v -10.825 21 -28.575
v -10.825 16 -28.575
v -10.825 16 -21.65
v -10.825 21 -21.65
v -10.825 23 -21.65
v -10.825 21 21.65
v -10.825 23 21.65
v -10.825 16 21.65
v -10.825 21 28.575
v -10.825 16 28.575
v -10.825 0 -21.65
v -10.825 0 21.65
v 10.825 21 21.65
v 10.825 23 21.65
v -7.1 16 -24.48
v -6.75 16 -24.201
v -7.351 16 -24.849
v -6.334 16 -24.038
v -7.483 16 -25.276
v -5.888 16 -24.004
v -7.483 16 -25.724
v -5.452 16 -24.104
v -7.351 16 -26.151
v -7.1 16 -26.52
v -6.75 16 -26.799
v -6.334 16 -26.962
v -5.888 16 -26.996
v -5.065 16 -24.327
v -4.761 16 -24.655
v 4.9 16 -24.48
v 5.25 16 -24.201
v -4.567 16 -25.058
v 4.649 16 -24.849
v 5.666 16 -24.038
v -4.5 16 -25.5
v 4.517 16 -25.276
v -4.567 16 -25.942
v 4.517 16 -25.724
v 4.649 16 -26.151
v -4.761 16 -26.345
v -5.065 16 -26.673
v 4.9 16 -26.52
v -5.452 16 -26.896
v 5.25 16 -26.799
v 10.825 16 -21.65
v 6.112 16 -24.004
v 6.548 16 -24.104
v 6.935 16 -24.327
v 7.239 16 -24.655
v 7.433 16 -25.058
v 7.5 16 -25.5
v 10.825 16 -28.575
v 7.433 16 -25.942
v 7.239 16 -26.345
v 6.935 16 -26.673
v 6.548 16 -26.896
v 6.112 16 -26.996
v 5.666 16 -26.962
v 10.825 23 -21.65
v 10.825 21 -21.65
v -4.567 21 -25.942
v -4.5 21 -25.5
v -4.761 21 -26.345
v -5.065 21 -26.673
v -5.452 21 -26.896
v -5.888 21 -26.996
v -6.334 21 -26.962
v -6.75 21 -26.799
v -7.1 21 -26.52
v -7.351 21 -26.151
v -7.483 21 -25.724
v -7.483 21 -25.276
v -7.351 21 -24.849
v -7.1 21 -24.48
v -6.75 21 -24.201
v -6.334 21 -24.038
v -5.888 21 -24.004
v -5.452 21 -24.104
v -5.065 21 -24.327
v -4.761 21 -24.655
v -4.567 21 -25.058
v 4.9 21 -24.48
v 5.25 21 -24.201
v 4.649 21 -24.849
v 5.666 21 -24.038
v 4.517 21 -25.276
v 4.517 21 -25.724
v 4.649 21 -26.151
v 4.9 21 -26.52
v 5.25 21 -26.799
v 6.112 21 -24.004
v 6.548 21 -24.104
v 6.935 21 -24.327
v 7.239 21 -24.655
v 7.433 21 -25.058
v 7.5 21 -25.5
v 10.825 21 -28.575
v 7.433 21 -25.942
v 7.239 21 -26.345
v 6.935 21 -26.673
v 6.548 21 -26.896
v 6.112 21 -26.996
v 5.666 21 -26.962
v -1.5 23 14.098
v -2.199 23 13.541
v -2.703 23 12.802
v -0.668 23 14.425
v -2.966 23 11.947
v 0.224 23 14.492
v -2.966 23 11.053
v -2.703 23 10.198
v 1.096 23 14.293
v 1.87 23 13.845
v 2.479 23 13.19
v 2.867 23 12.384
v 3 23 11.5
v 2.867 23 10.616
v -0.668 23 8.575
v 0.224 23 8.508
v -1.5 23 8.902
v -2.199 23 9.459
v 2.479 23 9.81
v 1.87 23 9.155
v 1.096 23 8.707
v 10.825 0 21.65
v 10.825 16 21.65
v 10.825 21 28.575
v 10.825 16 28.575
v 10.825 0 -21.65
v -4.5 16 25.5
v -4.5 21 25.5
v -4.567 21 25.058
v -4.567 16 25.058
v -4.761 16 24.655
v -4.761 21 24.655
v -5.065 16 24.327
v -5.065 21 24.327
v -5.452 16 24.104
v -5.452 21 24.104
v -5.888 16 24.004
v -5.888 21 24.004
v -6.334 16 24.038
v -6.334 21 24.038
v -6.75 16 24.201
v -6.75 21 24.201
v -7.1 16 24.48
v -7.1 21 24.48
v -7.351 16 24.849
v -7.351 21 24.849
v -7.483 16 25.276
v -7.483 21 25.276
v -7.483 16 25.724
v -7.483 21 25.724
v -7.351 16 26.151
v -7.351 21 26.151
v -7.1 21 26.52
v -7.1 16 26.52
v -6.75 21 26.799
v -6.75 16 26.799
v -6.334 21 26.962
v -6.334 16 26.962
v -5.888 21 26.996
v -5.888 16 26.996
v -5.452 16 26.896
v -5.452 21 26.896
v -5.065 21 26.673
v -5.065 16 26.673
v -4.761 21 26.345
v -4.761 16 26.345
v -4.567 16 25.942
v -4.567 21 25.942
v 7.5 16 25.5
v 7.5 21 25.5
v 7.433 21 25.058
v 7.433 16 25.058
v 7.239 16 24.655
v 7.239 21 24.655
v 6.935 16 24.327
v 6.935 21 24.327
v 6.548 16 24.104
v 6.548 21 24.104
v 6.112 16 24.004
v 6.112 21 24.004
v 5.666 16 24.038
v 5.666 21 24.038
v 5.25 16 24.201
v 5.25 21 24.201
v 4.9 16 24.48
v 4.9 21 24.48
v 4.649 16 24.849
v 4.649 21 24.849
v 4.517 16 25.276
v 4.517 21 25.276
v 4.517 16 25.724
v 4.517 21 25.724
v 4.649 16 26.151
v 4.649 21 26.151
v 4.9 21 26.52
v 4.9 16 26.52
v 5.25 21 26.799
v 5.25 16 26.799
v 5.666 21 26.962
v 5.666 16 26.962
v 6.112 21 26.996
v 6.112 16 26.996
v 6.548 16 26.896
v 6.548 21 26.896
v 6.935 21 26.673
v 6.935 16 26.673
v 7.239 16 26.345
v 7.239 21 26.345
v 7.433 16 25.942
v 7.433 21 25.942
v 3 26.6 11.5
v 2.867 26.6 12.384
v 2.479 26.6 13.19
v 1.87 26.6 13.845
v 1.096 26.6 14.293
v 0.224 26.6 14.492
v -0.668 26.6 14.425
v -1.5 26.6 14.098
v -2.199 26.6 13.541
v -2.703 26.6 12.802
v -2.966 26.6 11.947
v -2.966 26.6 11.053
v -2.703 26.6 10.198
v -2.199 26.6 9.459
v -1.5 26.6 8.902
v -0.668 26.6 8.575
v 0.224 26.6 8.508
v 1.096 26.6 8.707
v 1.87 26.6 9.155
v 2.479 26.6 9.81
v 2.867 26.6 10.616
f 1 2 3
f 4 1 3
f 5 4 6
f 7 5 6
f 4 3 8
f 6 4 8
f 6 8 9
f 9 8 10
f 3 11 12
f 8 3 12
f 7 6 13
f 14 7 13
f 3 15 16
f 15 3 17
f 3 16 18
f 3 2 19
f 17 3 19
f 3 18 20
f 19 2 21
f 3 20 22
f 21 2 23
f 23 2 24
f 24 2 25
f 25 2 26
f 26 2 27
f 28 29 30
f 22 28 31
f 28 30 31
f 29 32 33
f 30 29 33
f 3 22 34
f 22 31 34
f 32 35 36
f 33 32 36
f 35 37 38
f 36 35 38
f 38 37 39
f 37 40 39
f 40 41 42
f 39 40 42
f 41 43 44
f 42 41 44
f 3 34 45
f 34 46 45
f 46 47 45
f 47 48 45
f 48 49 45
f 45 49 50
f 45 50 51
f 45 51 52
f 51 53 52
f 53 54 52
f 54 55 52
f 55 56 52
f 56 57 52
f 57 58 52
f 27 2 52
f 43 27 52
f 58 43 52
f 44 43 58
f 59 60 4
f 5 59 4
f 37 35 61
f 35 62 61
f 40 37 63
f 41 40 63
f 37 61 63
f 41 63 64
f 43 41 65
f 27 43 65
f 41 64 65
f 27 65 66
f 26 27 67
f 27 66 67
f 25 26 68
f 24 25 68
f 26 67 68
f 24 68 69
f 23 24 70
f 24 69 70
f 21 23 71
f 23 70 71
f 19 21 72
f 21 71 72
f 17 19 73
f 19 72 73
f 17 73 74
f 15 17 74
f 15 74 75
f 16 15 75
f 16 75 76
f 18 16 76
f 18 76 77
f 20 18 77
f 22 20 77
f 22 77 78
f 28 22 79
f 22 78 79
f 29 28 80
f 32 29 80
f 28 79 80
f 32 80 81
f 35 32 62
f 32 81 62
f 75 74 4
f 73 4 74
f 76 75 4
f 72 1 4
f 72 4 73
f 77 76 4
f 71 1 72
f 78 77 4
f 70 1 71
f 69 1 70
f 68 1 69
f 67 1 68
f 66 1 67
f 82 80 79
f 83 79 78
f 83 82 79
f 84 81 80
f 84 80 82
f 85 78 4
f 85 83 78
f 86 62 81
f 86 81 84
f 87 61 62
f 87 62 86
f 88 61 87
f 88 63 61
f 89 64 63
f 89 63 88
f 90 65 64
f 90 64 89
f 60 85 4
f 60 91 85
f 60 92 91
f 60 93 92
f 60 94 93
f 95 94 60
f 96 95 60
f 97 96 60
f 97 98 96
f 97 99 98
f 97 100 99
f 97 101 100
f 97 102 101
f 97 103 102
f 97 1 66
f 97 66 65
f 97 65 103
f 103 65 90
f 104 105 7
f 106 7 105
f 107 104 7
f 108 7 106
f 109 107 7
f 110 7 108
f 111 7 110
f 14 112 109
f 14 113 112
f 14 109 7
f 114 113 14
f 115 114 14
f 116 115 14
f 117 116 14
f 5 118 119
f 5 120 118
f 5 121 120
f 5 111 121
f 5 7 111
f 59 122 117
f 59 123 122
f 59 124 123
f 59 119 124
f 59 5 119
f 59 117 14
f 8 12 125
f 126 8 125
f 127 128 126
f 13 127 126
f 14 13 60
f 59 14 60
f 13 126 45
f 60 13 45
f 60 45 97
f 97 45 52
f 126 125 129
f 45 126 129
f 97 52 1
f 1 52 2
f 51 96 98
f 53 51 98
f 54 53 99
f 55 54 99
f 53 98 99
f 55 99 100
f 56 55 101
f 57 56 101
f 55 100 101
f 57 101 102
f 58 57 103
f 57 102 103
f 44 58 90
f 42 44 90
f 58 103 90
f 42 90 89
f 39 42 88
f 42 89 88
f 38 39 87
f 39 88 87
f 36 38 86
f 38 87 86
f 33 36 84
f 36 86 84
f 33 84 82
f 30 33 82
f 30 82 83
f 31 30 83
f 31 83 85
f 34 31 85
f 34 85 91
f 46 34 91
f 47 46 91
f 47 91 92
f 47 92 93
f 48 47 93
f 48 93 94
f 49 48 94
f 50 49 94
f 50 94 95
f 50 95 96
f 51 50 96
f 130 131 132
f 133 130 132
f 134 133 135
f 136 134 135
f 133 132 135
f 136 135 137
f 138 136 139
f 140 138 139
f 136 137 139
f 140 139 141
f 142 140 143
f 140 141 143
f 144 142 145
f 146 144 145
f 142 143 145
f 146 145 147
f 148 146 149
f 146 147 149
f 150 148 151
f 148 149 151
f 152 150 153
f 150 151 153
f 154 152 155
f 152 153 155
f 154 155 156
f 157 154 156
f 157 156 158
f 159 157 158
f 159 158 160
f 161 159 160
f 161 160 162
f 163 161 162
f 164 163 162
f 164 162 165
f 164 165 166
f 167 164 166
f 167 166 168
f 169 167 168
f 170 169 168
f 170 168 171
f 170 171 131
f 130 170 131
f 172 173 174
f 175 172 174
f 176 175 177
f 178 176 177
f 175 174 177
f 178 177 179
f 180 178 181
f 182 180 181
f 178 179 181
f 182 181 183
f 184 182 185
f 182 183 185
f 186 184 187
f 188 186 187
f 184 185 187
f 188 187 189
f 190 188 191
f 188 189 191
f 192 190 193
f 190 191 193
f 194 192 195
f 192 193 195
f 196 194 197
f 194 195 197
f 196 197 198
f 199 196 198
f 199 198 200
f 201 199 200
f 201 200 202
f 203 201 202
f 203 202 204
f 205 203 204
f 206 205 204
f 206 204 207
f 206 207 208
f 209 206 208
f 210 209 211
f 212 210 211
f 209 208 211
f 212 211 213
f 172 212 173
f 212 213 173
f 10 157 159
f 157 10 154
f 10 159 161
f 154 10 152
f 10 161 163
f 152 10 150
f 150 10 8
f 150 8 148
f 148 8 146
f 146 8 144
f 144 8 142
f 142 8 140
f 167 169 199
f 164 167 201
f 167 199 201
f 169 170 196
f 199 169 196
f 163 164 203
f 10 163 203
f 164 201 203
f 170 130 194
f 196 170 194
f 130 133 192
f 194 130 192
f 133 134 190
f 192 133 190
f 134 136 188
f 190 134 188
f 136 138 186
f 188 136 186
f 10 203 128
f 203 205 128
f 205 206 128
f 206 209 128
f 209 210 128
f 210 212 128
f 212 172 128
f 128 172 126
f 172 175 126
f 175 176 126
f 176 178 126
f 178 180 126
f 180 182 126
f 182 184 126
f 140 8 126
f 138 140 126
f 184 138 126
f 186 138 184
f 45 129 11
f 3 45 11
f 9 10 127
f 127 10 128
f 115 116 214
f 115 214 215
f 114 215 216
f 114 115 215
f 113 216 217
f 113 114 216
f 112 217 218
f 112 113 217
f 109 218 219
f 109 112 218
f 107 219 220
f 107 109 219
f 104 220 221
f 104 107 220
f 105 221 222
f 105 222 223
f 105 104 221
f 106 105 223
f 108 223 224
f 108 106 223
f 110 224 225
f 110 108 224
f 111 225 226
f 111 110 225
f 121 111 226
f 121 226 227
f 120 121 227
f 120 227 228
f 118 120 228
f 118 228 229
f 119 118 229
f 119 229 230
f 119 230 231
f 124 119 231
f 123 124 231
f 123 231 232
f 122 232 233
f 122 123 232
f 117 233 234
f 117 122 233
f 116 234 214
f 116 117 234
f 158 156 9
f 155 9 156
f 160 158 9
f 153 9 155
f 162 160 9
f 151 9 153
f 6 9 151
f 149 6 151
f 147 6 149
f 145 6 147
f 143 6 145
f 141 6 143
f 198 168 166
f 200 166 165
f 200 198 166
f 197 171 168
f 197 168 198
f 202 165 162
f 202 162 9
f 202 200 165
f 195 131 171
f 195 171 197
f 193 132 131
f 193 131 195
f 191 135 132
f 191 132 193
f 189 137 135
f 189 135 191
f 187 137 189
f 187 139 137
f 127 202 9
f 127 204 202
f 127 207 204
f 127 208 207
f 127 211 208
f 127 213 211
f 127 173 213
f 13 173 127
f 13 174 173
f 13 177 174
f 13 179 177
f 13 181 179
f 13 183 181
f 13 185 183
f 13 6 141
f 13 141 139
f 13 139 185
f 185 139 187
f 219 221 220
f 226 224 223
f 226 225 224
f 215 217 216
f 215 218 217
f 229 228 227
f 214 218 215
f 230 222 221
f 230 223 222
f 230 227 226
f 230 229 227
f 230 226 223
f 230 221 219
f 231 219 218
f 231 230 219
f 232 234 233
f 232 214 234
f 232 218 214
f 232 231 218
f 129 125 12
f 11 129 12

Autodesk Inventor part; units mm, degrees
ref_plane "YZ Plane" through (0, 0, 0) normal (1, 0, 0) x (0, 1, 0)
ref_plane "XZ Plane" through (0, 0, 0) normal (0, 1, 0) x (-1, 0, 0)
ref_plane "XY Plane" through (0, 0, 0) normal (0, 0, 1) x (1, 0, 0)
sketch "スケッチ1" plane through (0, 0, 0) normal (0, 1, 0) x (-1, 0, 0)
  line L0 (10.825, 21.65) -> (-10.825, 21.65)
  line L1 (-10.825, 21.65) -> (-10.825, -21.65)
  line L2 (-10.825, -21.65) -> (10.825, -21.65)
  line L3 (10.825, -21.65) -> (10.825, 21.65)
  line L4 (0, -42.6095) -> (0, 37.4005) projected
  line L5 (-15.3503, 0) -> (16.327, 0) projected
  point P0 (0, 0)
  dimension "d0" = 21.65
  dimension "d1" = 43.3
extrude "押し出し1" add sketch "スケッチ1" along normal blind 16
sketch "スケッチ2" plane through (0, 16, 0) normal (0, 1, 0) x (1, 0, 0)
  line L0 (-10.825, -28.575) -> (10.825, -28.575)
  line L1 (10.825, -28.575) -> (10.825, 28.575)
  line L2 (10.825, 28.575) -> (-10.825, 28.575)
  line L3 (-10.825, 28.575) -> (-10.825, -28.575)
  line L4 (15.155, 0) -> (-15.155, 0) projected
  point P0 (0, 0)
  point P1 (-10.825, -21.65)
  point P2 (10.825, -21.65)
  dimension "d4" = 57.15
extrude "押し出し2" add sketch "スケッチ2" along normal blind 5
sketch "スケッチ3" plane through (0, 21, 0) normal (0, 1, 0) x (1, 0, 0)
  circle A0 centre (-6, -25.5) radius 1.5
  circle A1 centre (6, -25.5) radius 1.5
  circle A2 centre (-6, 25.5) radius 1.5
  circle A3 centre (6, 25.5) radius 1.5
  line L0 (15.155, 0) -> (-15.155, 0) projected
  line L1 (0, 40.005) -> (0, -40.005) projected
  point P0 (0, 0)
  dimension "d9" = 3
  dimension "d10" = 3
  dimension "d11" = 3
  dimension "d12" = 3
  dimension "d13" = 12
  dimension "d14" = 12
  dimension "d15" = 51
  dimension "d16" = 51
extrude "押し出し3" cut sketch "スケッチ3" against normal up to next
sketch "スケッチ4" plane through (0, 21, 0) normal (0, 1, 0) x (1, 0, 0)
  line L0 (10.825, 21.65) -> (-10.825, 21.65) projected
  line L1 (-10.825, -21.65) -> (10.825, -21.65) projected
  line L2 (-10.825, 28.575) -> (-10.825, -28.575) projected
  line L3 (10.825, -28.575) -> (10.825, 28.575) projected
  point P0 (0, 0)
extrude "押し出し4" add sketch "スケッチ4" along normal blind 2
sketch "スケッチ5" plane through (0, 23, 0) normal (0, 1, 0) x (1, 0, 0)
  circle A0 centre (0, -11.5) radius 3
  circle A1 centre (6, -25.5) radius 1.5 projected
  line L0 (0, 40.005) -> (0, -40.005) projected
  point P0 (0, 0)
  dimension "d21" = 14
  dimension "d22" = 6
extrude "押し出し5" add sketch "スケッチ5" along normal blind 3.6 contours A0 L0 | L0 A0
properties part number "servo"
